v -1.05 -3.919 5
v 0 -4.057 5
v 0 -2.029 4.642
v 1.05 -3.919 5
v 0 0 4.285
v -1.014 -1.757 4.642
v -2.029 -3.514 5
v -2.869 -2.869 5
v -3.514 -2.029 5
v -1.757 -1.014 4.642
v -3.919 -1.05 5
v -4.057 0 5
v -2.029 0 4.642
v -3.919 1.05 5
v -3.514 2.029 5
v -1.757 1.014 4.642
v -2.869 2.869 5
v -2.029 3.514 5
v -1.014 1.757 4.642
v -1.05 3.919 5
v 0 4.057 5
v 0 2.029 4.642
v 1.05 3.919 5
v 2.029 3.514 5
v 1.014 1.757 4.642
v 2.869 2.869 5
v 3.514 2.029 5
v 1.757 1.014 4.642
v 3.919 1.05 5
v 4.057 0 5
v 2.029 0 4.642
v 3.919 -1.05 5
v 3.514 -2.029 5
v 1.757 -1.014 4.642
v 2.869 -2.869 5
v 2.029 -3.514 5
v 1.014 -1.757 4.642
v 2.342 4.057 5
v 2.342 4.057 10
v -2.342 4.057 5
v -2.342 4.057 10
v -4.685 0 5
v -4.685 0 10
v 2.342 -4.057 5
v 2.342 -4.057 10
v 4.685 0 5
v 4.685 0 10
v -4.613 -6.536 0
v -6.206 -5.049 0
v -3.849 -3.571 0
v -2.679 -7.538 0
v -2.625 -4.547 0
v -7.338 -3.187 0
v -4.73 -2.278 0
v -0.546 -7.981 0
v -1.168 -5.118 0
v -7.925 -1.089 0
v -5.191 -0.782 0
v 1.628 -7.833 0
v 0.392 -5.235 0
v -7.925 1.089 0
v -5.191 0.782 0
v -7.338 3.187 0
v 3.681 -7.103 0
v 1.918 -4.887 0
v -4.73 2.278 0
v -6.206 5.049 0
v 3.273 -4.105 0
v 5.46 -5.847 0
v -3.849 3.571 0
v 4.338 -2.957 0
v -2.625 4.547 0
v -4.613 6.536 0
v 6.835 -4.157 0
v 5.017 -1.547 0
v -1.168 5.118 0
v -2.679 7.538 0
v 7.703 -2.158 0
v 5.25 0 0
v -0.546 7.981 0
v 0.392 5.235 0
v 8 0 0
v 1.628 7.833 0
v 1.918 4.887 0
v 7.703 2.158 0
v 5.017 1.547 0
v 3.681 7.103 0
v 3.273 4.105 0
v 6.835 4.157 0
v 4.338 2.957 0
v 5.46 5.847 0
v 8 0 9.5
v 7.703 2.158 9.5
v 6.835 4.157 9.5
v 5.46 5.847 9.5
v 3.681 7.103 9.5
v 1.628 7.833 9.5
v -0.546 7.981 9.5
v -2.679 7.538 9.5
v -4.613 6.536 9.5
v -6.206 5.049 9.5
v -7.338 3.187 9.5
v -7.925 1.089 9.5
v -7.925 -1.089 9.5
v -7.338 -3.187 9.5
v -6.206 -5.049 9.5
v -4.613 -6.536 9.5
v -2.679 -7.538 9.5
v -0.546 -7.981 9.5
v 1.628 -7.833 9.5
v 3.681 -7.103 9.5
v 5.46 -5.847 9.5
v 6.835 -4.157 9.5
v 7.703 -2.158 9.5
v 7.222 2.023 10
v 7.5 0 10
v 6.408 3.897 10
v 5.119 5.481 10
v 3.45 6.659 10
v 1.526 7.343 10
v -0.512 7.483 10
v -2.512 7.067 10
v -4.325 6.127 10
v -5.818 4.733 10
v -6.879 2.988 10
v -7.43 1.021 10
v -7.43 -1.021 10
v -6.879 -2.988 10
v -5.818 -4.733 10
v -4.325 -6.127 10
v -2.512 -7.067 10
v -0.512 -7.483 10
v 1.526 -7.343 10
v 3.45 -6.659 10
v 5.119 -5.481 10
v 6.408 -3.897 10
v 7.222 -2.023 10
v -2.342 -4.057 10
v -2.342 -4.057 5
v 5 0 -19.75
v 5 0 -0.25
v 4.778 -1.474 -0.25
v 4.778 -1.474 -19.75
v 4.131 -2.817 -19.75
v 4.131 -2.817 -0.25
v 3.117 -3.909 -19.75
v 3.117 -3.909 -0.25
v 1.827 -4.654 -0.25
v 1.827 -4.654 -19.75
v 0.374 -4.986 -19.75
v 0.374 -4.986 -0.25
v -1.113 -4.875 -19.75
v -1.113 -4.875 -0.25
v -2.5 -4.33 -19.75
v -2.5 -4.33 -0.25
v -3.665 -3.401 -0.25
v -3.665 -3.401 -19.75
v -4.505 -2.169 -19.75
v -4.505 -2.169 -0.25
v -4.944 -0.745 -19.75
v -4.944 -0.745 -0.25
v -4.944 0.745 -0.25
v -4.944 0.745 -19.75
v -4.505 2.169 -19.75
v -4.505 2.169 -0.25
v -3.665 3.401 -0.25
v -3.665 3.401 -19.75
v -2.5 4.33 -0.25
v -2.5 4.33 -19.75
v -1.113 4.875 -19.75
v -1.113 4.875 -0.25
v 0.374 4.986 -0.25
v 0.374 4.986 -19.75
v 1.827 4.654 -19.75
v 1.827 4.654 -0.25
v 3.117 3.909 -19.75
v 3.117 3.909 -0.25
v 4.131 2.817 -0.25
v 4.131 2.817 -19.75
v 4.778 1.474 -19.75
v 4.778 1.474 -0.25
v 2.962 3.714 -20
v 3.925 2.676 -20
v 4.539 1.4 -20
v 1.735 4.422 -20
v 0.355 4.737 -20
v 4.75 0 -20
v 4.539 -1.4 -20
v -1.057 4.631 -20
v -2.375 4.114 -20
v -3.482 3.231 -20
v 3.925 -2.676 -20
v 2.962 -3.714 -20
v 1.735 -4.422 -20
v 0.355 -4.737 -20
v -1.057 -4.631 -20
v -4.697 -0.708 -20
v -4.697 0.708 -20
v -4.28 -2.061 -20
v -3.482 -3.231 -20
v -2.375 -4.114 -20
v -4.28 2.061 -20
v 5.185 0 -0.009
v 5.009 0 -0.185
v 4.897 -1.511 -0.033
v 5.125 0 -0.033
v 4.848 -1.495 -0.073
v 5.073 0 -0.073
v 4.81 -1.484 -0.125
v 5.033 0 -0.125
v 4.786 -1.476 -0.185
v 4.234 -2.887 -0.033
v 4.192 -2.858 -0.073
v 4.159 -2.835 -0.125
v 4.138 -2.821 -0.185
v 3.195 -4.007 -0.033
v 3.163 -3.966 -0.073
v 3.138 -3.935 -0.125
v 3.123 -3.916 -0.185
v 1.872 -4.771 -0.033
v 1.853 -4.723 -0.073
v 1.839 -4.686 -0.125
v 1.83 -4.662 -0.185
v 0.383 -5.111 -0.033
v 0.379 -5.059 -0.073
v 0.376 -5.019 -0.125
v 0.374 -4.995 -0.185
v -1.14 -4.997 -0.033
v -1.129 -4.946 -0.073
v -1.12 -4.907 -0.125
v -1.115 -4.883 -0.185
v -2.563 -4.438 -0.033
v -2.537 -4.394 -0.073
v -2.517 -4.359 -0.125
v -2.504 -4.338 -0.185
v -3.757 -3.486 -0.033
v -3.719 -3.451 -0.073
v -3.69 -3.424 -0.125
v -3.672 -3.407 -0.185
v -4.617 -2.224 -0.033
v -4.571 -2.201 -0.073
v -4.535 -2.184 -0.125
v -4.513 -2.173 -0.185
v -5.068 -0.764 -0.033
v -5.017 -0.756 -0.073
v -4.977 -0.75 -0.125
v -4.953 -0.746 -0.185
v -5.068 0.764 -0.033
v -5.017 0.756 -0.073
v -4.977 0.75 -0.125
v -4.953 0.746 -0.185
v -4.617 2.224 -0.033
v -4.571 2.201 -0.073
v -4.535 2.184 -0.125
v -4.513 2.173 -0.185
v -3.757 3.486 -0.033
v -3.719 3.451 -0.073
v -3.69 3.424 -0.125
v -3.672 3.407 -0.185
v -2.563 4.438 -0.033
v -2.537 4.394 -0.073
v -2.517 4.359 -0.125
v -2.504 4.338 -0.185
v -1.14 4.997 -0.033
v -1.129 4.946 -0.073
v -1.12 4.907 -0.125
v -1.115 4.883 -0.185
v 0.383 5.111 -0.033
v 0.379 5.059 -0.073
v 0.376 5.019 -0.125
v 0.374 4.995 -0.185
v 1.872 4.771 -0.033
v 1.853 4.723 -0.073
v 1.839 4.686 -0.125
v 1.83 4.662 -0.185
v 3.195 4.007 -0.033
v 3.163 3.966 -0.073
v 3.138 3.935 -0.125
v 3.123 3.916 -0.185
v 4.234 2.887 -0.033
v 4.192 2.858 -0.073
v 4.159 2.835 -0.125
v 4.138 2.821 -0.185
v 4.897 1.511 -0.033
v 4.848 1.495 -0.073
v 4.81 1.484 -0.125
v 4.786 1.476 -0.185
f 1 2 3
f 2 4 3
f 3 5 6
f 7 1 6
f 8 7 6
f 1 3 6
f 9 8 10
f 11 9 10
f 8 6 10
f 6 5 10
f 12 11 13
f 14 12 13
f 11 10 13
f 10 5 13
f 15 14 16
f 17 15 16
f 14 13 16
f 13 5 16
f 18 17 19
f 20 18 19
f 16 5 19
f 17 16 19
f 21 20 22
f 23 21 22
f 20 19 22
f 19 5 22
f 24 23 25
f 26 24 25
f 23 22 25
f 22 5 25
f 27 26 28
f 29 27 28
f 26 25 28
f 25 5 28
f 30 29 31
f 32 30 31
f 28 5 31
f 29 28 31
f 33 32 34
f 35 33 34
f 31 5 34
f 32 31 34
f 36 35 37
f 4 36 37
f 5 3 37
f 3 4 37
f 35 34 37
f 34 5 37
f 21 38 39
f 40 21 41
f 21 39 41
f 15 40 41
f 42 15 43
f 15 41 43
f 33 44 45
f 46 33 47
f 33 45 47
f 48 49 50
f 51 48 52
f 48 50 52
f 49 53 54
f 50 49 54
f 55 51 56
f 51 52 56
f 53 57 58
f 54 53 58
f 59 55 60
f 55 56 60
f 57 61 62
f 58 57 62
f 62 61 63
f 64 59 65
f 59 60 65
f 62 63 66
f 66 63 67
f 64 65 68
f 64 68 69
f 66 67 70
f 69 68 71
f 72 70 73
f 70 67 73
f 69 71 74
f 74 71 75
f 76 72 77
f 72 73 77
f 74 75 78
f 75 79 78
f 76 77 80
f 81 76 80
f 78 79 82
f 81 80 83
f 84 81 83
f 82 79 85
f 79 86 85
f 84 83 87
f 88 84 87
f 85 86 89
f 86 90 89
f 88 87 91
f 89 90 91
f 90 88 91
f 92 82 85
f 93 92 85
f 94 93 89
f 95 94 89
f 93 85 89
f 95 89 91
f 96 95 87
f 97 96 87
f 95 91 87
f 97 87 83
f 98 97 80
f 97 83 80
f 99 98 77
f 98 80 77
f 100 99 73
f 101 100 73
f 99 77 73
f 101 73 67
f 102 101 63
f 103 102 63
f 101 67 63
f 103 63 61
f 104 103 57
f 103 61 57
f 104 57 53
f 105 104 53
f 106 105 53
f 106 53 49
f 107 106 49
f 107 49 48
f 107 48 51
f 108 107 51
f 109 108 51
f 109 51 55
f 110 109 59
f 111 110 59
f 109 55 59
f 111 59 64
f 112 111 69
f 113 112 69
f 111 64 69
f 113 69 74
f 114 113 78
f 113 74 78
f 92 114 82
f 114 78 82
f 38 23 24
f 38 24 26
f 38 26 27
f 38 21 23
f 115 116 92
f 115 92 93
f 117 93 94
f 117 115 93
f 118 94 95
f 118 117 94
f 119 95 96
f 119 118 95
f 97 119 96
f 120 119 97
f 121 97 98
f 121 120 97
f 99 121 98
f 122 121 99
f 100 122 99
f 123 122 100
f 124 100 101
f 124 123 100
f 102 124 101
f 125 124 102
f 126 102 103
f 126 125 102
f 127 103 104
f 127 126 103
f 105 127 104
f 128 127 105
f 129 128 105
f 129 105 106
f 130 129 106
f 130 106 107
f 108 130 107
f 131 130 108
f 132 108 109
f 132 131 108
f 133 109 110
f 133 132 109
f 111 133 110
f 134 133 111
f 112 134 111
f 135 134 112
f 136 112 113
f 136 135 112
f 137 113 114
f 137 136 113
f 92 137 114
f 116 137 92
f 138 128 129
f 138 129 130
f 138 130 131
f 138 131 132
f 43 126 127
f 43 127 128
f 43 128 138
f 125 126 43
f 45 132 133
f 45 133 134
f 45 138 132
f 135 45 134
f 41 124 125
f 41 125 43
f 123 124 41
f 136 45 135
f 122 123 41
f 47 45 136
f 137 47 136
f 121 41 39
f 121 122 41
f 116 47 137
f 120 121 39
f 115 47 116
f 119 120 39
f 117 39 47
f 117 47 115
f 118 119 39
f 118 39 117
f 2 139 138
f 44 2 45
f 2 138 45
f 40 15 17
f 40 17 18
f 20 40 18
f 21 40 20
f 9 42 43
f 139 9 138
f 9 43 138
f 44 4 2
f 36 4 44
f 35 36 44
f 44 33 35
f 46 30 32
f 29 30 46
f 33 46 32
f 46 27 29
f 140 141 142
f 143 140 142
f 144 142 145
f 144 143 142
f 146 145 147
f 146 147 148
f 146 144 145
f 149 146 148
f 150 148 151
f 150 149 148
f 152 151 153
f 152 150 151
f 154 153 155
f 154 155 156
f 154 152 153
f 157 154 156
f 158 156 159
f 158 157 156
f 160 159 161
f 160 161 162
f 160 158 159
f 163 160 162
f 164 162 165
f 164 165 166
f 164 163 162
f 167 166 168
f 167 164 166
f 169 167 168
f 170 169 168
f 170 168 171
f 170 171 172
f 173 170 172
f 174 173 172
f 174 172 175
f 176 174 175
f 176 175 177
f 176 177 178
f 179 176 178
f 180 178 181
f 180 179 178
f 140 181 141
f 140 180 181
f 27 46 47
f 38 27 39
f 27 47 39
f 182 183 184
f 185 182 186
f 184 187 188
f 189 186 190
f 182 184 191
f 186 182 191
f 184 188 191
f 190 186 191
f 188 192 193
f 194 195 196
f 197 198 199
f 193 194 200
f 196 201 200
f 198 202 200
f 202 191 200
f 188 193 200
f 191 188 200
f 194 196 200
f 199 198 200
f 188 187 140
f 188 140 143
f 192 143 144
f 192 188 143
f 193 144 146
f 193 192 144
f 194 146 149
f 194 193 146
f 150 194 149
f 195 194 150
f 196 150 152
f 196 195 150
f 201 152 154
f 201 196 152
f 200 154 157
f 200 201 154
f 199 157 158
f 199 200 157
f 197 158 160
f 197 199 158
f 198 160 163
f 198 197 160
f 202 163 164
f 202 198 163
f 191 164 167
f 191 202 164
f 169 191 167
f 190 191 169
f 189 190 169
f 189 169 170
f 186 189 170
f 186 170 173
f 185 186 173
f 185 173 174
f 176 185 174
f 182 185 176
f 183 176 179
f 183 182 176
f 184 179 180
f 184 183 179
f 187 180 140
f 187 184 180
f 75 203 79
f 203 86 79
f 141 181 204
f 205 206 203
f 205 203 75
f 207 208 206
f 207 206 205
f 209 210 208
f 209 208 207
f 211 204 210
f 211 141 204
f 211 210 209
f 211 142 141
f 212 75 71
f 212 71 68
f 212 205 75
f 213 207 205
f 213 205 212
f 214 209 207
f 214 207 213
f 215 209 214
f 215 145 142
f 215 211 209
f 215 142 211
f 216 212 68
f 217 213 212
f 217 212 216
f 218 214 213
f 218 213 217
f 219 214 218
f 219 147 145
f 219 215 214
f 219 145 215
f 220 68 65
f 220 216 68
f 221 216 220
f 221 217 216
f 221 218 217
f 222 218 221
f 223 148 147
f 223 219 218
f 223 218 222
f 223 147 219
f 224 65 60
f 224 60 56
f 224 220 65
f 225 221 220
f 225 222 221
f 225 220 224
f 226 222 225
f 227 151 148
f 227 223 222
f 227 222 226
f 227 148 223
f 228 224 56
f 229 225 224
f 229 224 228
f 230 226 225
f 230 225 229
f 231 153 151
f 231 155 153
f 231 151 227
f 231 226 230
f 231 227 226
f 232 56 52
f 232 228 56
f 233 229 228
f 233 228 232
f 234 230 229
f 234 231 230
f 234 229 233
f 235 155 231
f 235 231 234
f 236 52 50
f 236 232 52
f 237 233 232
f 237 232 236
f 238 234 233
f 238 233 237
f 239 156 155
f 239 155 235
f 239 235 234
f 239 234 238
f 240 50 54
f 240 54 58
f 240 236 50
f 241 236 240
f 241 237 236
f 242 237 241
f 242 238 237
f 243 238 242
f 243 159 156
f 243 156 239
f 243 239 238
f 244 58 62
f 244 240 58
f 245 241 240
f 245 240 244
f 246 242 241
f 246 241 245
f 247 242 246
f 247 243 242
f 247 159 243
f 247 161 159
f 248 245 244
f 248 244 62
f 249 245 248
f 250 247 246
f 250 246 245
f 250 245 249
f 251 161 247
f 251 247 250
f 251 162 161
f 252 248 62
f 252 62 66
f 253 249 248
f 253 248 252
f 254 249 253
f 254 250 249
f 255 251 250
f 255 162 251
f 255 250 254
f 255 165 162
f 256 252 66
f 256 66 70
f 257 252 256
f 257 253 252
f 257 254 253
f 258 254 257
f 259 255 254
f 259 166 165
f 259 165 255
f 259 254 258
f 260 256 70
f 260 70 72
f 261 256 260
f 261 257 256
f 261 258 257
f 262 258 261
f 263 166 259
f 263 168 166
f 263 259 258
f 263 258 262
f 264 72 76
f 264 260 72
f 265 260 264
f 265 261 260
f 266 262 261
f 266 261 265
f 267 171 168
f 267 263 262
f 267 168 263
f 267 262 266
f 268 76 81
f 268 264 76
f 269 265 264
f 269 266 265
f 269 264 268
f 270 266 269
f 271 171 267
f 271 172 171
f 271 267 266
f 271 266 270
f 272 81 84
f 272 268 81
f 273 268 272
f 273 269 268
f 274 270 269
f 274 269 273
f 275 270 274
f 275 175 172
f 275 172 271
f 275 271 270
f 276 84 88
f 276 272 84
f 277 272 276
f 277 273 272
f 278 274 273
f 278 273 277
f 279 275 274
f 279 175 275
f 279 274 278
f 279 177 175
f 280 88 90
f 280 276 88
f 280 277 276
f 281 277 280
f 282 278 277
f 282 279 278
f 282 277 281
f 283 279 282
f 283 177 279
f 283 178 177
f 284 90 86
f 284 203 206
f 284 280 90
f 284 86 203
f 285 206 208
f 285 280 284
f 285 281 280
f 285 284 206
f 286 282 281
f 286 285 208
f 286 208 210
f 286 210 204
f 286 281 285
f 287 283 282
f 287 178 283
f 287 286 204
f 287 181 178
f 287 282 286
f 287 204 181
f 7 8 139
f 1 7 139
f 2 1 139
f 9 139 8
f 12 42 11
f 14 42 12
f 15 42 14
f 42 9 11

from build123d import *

# Parameters (mm, degrees)
IZIM1_R                = 8
KAFA_YUKSEKLIGI_DEPTH  = 10
PAH1_SIZE              = 0.5
ALTIGEN_BOSALTMA_DEPTH = 5
IZIM5_W                = 5
IZIM5_H                = 20
RADYUS1_R              = 0.25
PAH2_SIZE              = 0.25


with BuildPart() as part:
    # Çizim1 → KAFA_YUKSEKLIGI (new body)
    with BuildSketch(Plane.XY):
        Circle(IZIM1_R)
    extrude(amount=KAFA_YUKSEKLIGI_DEPTH)

    # Pah1
    pah1_edges = [part.edges().sort_by_distance(p)[0] for p in [
        (-8, 0, 10),
    ]]
    chamfer(pah1_edges, length=PAH1_SIZE)

    # Çizim2 → ALTIGEN_BOSALTMA (cut)
    with BuildSketch(Plane.XY.offset(10)):
        Polygon((-4.685, 0), (-2.3425, -4.057329017), (2.3425, -4.057329017), (4.685, 0), (2.3425, 4.057329017), (-2.3425, 4.057329017), align=None)
    extrude(amount=-ALTIGEN_BOSALTMA_DEPTH, mode=Mode.SUBTRACT)

    # Kes-Ekstrüzyon2 cone 1 section (through the dimple's axis) → Kes-Ekstrüzyon2 (revolve, cut)
    with BuildSketch(Plane(origin=(0, 0, 5), x_dir=(0, -1, 0), z_dir=(1, 0, 0))):
        Polygon((0, 0), (4.057329017, 0), (0, 0.715416575), align=None)
    revolve(axis=Axis((0, 0, 5), (0, 0, -1)), mode=Mode.SUBTRACT)

    # Çizim5 → Döndür1 (revolve)
    with BuildSketch(Plane(origin=(0, 0, 0), x_dir=(1, 0, 0), z_dir=(0, 1, 0))):
        with Locations((2.5, 10)):
            Rectangle(IZIM5_W, IZIM5_H)
    revolve(axis=Axis((0, 0, 0), (0, 0, -1)))

    # Radyus1
    radyus1_edges = [part.edges().sort_by_distance(p)[0] for p in [
        (-5, 0, 0),
    ]]
    fillet(radyus1_edges, radius=RADYUS1_R)

    # Pah2
    pah2_edges = [part.edges().sort_by_distance(p)[0] for p in [
        (-5, 0, -20),
    ]]
    chamfer(pah2_edges, length=PAH2_SIZE)


solid = part.part
